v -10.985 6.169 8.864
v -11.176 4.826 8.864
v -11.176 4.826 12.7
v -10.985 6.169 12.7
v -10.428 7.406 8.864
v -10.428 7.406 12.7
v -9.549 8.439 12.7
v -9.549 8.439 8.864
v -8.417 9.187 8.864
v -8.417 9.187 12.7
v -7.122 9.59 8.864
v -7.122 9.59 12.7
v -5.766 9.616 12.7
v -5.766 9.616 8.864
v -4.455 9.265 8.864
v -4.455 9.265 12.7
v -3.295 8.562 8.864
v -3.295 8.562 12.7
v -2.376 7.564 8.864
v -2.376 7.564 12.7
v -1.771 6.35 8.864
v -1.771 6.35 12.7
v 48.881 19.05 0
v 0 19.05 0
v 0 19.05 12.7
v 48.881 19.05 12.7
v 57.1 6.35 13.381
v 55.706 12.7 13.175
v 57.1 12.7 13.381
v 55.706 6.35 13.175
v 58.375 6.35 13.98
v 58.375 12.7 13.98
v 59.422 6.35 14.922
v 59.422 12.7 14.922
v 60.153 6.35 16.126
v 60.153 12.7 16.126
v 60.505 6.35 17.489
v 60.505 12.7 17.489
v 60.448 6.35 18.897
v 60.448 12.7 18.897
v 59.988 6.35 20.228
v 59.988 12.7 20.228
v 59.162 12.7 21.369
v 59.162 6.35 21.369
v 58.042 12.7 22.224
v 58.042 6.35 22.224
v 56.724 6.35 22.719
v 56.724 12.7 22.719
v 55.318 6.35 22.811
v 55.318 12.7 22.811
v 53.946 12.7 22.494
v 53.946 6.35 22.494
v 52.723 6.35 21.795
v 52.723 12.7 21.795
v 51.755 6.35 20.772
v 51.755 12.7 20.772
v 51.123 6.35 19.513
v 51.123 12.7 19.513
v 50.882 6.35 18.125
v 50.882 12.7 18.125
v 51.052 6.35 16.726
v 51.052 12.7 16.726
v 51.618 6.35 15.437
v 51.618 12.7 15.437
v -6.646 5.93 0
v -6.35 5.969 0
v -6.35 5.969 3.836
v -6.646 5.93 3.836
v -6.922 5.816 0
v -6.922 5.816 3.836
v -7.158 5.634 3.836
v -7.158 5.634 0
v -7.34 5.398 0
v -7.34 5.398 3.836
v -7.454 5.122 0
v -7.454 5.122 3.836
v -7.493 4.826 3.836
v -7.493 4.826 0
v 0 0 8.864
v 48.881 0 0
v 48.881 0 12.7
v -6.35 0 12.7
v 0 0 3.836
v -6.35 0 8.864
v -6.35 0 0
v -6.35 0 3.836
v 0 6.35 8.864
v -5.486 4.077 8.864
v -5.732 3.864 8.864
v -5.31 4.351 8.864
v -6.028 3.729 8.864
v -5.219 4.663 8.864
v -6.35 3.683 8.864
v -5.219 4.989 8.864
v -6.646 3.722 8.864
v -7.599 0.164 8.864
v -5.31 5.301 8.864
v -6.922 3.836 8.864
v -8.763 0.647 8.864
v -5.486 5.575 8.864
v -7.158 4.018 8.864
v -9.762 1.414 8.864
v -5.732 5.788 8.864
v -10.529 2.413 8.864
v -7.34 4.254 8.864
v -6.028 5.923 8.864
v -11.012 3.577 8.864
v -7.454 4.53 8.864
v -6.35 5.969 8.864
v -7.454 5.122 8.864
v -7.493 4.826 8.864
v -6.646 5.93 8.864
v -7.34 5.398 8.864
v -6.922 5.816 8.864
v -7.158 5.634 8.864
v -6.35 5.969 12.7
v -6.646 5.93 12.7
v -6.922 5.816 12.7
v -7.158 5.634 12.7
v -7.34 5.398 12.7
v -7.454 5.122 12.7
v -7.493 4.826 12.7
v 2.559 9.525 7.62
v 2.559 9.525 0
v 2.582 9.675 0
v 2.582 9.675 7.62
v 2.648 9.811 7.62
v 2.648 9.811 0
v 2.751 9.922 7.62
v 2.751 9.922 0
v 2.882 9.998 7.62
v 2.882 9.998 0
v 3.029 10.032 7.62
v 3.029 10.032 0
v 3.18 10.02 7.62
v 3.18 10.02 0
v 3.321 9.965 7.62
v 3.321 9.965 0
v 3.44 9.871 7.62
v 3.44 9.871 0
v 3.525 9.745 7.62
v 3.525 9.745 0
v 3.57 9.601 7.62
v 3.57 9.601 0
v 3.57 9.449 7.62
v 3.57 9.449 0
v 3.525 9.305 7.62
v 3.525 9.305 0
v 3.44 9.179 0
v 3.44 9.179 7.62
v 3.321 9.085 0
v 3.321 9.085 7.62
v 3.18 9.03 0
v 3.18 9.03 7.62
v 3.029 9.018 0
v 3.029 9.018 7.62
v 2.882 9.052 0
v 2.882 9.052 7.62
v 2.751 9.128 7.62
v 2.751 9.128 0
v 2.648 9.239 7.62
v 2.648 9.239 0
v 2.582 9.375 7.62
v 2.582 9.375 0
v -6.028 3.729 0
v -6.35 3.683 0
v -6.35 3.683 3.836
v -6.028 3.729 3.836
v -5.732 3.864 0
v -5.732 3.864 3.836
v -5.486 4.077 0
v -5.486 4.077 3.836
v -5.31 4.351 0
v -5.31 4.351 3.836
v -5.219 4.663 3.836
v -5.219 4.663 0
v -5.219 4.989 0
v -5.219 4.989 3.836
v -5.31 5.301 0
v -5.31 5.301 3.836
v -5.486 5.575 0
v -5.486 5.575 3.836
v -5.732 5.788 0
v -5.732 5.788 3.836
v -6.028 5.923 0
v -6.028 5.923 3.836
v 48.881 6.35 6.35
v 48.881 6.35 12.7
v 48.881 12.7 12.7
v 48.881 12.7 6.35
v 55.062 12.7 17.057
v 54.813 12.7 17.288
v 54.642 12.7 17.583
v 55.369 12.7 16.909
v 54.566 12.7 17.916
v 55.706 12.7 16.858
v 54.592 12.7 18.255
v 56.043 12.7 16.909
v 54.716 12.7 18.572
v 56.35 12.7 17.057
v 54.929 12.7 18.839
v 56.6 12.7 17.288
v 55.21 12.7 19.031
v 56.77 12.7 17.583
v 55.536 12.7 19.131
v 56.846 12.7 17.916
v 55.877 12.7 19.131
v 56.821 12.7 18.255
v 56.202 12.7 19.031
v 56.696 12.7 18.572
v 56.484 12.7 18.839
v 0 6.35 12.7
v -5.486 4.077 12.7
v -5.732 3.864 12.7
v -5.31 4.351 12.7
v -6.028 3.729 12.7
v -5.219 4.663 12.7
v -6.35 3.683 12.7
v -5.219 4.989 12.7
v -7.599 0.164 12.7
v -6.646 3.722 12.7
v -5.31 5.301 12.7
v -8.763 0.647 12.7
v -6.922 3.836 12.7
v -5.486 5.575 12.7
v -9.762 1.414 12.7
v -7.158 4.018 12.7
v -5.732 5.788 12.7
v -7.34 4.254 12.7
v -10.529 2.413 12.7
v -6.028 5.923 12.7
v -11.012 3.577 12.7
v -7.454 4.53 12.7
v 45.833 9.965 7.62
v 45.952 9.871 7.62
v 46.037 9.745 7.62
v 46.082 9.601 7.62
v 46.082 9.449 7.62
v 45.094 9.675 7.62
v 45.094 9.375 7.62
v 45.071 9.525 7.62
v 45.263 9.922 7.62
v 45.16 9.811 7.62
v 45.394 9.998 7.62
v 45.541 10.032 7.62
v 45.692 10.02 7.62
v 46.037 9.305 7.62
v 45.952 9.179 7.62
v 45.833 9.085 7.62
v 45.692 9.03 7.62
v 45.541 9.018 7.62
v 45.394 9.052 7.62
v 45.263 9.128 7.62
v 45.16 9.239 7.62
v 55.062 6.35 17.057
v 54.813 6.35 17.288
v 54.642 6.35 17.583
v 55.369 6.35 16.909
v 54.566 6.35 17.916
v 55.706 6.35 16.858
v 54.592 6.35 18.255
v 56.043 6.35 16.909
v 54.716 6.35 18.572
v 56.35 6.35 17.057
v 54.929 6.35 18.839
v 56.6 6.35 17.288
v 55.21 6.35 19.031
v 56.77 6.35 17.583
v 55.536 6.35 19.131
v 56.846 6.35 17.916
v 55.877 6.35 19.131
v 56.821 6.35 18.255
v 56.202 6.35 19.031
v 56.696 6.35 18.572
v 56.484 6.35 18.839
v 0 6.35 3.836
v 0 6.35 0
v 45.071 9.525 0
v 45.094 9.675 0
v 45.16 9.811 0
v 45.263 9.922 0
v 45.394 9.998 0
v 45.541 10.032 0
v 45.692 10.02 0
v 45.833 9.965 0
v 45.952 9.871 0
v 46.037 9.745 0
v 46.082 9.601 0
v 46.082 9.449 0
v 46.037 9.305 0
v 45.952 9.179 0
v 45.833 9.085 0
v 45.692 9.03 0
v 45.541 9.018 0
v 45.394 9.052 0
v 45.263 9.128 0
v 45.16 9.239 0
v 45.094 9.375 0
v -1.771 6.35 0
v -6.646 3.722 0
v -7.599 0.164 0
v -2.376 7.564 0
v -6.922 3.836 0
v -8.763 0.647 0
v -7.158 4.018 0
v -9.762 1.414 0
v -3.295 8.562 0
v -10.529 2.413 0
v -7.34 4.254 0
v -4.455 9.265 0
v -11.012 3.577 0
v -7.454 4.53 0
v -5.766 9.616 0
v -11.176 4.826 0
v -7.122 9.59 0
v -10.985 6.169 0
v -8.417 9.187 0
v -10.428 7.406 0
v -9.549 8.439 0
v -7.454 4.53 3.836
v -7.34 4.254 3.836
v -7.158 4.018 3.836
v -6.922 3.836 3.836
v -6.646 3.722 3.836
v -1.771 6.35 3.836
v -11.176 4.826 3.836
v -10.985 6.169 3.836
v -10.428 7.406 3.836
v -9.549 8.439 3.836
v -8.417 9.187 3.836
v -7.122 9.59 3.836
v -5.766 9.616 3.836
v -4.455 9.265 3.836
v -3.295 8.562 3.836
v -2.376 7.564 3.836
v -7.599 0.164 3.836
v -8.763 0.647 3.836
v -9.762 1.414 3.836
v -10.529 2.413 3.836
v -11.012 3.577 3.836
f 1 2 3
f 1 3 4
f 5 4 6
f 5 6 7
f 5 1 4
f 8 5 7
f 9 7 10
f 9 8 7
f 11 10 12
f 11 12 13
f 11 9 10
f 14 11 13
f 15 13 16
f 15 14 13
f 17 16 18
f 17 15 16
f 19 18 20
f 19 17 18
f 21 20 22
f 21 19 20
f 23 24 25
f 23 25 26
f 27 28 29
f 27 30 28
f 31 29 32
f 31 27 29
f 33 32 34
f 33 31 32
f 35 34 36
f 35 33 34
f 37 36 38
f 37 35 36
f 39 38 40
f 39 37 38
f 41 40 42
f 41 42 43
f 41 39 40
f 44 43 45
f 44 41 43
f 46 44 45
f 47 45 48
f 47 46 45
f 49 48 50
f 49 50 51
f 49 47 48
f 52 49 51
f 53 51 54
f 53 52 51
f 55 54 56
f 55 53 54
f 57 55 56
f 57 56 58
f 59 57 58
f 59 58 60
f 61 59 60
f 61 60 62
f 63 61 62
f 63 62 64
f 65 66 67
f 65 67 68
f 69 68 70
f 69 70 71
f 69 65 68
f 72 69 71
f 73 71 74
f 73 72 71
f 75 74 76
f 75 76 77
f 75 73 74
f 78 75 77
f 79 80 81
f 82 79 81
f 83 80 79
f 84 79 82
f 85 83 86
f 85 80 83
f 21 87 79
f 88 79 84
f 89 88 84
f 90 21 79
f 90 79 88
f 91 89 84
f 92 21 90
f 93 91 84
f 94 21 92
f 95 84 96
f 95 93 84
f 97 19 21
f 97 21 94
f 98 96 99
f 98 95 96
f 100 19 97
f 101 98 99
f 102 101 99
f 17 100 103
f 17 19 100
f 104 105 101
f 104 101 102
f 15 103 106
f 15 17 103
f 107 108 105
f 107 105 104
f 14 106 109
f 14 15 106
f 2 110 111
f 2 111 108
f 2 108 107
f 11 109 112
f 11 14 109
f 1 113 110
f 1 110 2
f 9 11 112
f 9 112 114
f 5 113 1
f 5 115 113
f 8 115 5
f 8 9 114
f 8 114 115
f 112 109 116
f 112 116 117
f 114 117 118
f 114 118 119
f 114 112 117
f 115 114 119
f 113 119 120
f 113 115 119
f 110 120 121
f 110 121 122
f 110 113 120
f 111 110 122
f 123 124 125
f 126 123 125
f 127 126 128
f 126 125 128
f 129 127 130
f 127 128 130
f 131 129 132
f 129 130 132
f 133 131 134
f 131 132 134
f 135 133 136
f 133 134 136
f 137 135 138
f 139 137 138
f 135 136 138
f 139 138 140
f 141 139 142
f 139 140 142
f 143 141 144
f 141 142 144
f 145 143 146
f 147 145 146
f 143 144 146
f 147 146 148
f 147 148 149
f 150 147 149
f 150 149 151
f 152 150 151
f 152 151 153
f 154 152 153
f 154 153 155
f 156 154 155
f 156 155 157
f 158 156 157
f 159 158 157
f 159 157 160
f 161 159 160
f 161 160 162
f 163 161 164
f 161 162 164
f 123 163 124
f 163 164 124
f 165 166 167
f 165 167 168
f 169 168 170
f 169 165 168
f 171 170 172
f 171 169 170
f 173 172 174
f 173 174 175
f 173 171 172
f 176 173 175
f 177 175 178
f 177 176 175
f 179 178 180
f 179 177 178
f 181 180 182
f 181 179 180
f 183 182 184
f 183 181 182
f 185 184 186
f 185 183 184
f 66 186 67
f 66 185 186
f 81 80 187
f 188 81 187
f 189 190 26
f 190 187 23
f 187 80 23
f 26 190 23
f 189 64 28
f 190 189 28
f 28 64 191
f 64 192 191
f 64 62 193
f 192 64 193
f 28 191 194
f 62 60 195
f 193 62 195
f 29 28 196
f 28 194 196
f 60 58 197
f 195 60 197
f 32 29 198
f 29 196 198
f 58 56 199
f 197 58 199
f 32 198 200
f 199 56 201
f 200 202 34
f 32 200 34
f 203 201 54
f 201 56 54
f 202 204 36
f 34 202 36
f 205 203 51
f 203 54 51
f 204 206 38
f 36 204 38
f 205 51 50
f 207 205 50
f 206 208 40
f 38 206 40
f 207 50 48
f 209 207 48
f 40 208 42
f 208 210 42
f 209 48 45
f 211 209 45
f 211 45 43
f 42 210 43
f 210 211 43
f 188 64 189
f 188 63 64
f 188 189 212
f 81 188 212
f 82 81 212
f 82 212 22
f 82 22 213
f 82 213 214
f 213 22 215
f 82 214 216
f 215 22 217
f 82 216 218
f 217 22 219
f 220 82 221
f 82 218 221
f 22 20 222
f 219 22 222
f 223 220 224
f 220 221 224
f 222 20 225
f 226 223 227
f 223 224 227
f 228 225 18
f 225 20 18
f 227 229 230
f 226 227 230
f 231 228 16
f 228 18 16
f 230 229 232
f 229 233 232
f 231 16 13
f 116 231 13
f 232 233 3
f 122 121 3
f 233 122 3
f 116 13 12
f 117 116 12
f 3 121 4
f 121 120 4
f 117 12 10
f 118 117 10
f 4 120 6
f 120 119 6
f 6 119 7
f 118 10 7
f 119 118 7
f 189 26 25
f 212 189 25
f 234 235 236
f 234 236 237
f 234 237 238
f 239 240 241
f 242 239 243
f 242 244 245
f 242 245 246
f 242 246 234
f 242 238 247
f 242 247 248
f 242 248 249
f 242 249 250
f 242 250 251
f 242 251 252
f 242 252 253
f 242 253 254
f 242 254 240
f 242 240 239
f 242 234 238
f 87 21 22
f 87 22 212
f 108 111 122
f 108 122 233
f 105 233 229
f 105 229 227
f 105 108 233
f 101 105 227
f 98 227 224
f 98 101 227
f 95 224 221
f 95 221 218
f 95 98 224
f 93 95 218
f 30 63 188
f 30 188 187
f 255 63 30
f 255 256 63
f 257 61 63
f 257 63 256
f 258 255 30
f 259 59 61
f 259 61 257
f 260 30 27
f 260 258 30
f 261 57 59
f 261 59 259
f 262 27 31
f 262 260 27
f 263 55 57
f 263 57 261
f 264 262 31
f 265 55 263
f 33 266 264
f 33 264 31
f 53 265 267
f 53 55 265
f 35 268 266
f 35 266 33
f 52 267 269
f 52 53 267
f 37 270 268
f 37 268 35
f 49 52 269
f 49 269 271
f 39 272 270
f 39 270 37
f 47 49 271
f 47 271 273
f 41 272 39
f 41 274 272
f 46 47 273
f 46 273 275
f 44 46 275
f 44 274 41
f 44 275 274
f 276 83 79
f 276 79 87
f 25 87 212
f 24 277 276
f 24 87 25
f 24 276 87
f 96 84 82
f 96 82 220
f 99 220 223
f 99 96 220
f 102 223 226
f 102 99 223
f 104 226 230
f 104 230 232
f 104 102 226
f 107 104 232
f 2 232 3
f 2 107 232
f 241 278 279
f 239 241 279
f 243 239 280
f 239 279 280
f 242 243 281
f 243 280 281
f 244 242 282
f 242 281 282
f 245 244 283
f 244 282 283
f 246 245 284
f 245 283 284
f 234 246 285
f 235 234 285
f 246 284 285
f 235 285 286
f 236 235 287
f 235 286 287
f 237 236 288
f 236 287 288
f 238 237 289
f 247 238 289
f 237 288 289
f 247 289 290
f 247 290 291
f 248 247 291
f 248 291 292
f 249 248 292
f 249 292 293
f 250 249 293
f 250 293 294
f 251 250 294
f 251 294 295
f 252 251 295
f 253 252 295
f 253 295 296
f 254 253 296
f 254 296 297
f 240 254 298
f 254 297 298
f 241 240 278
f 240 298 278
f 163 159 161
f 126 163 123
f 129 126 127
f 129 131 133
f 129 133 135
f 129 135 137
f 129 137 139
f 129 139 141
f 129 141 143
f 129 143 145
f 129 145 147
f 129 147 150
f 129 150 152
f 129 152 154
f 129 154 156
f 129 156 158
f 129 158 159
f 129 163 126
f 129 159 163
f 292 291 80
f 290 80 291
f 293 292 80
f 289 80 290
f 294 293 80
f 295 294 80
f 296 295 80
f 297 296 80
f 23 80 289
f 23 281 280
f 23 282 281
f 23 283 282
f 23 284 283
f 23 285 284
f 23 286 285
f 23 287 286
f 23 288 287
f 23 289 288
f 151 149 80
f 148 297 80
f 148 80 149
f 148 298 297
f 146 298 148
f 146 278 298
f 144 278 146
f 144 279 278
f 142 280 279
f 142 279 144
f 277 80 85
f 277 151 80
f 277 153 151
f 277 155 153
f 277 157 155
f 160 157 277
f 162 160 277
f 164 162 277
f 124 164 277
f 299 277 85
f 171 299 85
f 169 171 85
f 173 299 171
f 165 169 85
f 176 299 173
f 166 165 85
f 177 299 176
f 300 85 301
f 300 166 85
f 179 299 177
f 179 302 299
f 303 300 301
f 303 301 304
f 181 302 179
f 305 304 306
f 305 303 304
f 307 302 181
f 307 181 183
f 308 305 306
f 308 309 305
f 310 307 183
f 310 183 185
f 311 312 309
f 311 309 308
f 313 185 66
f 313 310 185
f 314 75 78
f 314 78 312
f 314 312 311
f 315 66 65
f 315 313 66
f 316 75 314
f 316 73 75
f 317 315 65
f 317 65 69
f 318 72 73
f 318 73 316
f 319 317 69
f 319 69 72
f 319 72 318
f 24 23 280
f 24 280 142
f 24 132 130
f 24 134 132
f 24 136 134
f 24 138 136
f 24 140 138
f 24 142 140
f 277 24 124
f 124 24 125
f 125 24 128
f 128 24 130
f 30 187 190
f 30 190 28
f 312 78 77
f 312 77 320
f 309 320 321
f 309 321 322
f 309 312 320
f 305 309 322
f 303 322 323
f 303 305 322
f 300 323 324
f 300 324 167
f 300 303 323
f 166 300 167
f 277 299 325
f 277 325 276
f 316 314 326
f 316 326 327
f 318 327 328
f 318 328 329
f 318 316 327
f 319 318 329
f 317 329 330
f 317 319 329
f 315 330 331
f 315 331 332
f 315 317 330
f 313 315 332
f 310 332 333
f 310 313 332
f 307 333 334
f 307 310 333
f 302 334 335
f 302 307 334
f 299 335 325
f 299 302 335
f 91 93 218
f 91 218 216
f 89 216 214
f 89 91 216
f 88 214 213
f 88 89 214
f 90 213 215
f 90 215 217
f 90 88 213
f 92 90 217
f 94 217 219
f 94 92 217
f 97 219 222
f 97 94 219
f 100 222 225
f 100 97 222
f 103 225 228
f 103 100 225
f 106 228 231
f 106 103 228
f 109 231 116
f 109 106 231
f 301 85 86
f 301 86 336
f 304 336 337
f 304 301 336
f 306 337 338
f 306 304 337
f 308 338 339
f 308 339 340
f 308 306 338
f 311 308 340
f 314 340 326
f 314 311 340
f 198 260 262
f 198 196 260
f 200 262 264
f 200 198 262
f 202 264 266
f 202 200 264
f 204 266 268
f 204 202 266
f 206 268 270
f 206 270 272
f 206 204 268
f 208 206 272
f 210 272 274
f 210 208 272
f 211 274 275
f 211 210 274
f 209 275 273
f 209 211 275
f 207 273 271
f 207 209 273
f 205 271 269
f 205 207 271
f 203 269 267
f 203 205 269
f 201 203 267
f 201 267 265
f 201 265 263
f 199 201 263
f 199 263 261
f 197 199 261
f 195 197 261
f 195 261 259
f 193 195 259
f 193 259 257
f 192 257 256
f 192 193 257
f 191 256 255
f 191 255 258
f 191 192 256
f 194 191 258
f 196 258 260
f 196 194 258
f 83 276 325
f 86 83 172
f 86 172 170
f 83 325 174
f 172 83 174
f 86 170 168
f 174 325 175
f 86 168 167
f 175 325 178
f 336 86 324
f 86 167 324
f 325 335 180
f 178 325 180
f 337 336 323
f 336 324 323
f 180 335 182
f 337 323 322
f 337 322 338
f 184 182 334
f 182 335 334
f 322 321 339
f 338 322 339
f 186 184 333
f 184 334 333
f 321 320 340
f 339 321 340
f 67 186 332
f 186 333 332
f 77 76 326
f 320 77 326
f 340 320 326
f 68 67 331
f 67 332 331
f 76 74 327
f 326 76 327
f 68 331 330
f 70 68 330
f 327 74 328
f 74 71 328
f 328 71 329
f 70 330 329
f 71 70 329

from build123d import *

# Parameters (mm, degrees)
SKETCH1_W           = 48.881284
SKETCH1_H           = 19.05
BOSS_EXTRUDE2_DEPTH = 12.7
BOSS_EXTRUDE3_DEPTH = 3.836458333
LPATTERN1_COUNT     = 2
LPATTERN1_PITCH     = 8.863541667
BOSS_EXTRUDE5_START = -9.525
SKETCH3_R           = 1.143
BOSS_EXTRUDE5_DEPTH = 3.175
SKETCH4_R           = 0.508
CUT_EXTRUDE1_DEPTH  = 7.62


with BuildPart() as part:
    # Sketch1 → Boss-Extrude2 (new body)
    with BuildSketch(Plane.XY):
        with Locations((24.440642, 9.525)):
            Rectangle(SKETCH1_W, SKETCH1_H)
    extrude(amount=BOSS_EXTRUDE2_DEPTH)

    # Sketch2 → Boss-Extrude3 (add)
    with BuildSketch(Plane(origin=(0, 0, 0), x_dir=(-1, 0, 0), z_dir=(0, 0, -1))):
        with BuildLine():
            ThreePointArc((1.77094988, 6.35), (2.435597108, 2.003283932), (6.35, 0))
            Line((6.35, 0), (6.35, 3.683))
            ThreePointArc((6.35, 3.683), (5.207, 4.826), (6.35, 5.969))
            Line((6.35, 5.969), (6.35, 6.35))
            Line((6.35, 6.35), (1.77094988, 6.35))
        make_face()
        with BuildLine():
            Line((6.35, 3.683), (6.35, 0))
            ThreePointArc((6.35, 0), (9.762497326, 1.413502674), (11.176, 4.826))
            ThreePointArc((11.176, 4.826), (7.121939156, 9.589862502), (1.77094988, 6.35))
            Line((1.77094988, 6.35), (6.35, 6.35))
            Line((6.35, 6.35), (6.35, 5.969))
            ThreePointArc((6.35, 5.969), (7.158223051, 5.634223051), (7.493, 4.826))
            ThreePointArc((7.493, 4.826), (7.158223051, 4.017776949), (6.35, 3.683))
        make_face()
        with BuildLine():
            Line((0, 6.35), (0, 0))
            Line((0, 0), (6.35, 0))
            ThreePointArc((6.35, 0), (2.435597108, 2.003283932), (1.77094988, 6.35))
            Line((1.77094988, 6.35), (0, 6.35))
        make_face()
    boss_extrude3 = extrude(amount=-BOSS_EXTRUDE3_DEPTH)

    # LPattern1: Boss-Extrude3 ×2
    with Locations(*[(0, 0, i * LPATTERN1_PITCH) for i in range(1, LPATTERN1_COUNT)]):
        add(boss_extrude3)

    # Sketch3 → Boss-Extrude5 (add, symmetric)
    with BuildSketch(Plane.XZ.offset(BOSS_EXTRUDE5_START)):
        with BuildLine():
            Line((51.617945235, 15.436661235), (48.881284, 12.7))
            Line((48.881284, 12.7), (48.881284, 6.35))
            Line((48.881284, 6.35), (55.706278652, 13.174994652))
            ThreePointArc((55.706278652, 13.174994652), (58.04238684, 22.223893483), (51.617945235, 15.436661235))
        make_face()
        with Locations(Location((55.706278652, 18.000994652, 0), (0, 0, 270))):
            Circle(SKETCH3_R, mode=Mode.SUBTRACT)
    extrude(amount=BOSS_EXTRUDE5_DEPTH, both=True)

    # Sketch4 → Cut-Extrude1 (cut)
    with BuildSketch(Plane(origin=(0, 0, 0), x_dir=(-1, 0, 0), z_dir=(0, 0, -1))):
        with Locations((-45.579284, 9.525)):
            Circle(SKETCH4_R)
        with Locations((-3.067304, 9.525)):
            Circle(SKETCH4_R)
    extrude(amount=-CUT_EXTRUDE1_DEPTH, mode=Mode.SUBTRACT)


solid = part.part
